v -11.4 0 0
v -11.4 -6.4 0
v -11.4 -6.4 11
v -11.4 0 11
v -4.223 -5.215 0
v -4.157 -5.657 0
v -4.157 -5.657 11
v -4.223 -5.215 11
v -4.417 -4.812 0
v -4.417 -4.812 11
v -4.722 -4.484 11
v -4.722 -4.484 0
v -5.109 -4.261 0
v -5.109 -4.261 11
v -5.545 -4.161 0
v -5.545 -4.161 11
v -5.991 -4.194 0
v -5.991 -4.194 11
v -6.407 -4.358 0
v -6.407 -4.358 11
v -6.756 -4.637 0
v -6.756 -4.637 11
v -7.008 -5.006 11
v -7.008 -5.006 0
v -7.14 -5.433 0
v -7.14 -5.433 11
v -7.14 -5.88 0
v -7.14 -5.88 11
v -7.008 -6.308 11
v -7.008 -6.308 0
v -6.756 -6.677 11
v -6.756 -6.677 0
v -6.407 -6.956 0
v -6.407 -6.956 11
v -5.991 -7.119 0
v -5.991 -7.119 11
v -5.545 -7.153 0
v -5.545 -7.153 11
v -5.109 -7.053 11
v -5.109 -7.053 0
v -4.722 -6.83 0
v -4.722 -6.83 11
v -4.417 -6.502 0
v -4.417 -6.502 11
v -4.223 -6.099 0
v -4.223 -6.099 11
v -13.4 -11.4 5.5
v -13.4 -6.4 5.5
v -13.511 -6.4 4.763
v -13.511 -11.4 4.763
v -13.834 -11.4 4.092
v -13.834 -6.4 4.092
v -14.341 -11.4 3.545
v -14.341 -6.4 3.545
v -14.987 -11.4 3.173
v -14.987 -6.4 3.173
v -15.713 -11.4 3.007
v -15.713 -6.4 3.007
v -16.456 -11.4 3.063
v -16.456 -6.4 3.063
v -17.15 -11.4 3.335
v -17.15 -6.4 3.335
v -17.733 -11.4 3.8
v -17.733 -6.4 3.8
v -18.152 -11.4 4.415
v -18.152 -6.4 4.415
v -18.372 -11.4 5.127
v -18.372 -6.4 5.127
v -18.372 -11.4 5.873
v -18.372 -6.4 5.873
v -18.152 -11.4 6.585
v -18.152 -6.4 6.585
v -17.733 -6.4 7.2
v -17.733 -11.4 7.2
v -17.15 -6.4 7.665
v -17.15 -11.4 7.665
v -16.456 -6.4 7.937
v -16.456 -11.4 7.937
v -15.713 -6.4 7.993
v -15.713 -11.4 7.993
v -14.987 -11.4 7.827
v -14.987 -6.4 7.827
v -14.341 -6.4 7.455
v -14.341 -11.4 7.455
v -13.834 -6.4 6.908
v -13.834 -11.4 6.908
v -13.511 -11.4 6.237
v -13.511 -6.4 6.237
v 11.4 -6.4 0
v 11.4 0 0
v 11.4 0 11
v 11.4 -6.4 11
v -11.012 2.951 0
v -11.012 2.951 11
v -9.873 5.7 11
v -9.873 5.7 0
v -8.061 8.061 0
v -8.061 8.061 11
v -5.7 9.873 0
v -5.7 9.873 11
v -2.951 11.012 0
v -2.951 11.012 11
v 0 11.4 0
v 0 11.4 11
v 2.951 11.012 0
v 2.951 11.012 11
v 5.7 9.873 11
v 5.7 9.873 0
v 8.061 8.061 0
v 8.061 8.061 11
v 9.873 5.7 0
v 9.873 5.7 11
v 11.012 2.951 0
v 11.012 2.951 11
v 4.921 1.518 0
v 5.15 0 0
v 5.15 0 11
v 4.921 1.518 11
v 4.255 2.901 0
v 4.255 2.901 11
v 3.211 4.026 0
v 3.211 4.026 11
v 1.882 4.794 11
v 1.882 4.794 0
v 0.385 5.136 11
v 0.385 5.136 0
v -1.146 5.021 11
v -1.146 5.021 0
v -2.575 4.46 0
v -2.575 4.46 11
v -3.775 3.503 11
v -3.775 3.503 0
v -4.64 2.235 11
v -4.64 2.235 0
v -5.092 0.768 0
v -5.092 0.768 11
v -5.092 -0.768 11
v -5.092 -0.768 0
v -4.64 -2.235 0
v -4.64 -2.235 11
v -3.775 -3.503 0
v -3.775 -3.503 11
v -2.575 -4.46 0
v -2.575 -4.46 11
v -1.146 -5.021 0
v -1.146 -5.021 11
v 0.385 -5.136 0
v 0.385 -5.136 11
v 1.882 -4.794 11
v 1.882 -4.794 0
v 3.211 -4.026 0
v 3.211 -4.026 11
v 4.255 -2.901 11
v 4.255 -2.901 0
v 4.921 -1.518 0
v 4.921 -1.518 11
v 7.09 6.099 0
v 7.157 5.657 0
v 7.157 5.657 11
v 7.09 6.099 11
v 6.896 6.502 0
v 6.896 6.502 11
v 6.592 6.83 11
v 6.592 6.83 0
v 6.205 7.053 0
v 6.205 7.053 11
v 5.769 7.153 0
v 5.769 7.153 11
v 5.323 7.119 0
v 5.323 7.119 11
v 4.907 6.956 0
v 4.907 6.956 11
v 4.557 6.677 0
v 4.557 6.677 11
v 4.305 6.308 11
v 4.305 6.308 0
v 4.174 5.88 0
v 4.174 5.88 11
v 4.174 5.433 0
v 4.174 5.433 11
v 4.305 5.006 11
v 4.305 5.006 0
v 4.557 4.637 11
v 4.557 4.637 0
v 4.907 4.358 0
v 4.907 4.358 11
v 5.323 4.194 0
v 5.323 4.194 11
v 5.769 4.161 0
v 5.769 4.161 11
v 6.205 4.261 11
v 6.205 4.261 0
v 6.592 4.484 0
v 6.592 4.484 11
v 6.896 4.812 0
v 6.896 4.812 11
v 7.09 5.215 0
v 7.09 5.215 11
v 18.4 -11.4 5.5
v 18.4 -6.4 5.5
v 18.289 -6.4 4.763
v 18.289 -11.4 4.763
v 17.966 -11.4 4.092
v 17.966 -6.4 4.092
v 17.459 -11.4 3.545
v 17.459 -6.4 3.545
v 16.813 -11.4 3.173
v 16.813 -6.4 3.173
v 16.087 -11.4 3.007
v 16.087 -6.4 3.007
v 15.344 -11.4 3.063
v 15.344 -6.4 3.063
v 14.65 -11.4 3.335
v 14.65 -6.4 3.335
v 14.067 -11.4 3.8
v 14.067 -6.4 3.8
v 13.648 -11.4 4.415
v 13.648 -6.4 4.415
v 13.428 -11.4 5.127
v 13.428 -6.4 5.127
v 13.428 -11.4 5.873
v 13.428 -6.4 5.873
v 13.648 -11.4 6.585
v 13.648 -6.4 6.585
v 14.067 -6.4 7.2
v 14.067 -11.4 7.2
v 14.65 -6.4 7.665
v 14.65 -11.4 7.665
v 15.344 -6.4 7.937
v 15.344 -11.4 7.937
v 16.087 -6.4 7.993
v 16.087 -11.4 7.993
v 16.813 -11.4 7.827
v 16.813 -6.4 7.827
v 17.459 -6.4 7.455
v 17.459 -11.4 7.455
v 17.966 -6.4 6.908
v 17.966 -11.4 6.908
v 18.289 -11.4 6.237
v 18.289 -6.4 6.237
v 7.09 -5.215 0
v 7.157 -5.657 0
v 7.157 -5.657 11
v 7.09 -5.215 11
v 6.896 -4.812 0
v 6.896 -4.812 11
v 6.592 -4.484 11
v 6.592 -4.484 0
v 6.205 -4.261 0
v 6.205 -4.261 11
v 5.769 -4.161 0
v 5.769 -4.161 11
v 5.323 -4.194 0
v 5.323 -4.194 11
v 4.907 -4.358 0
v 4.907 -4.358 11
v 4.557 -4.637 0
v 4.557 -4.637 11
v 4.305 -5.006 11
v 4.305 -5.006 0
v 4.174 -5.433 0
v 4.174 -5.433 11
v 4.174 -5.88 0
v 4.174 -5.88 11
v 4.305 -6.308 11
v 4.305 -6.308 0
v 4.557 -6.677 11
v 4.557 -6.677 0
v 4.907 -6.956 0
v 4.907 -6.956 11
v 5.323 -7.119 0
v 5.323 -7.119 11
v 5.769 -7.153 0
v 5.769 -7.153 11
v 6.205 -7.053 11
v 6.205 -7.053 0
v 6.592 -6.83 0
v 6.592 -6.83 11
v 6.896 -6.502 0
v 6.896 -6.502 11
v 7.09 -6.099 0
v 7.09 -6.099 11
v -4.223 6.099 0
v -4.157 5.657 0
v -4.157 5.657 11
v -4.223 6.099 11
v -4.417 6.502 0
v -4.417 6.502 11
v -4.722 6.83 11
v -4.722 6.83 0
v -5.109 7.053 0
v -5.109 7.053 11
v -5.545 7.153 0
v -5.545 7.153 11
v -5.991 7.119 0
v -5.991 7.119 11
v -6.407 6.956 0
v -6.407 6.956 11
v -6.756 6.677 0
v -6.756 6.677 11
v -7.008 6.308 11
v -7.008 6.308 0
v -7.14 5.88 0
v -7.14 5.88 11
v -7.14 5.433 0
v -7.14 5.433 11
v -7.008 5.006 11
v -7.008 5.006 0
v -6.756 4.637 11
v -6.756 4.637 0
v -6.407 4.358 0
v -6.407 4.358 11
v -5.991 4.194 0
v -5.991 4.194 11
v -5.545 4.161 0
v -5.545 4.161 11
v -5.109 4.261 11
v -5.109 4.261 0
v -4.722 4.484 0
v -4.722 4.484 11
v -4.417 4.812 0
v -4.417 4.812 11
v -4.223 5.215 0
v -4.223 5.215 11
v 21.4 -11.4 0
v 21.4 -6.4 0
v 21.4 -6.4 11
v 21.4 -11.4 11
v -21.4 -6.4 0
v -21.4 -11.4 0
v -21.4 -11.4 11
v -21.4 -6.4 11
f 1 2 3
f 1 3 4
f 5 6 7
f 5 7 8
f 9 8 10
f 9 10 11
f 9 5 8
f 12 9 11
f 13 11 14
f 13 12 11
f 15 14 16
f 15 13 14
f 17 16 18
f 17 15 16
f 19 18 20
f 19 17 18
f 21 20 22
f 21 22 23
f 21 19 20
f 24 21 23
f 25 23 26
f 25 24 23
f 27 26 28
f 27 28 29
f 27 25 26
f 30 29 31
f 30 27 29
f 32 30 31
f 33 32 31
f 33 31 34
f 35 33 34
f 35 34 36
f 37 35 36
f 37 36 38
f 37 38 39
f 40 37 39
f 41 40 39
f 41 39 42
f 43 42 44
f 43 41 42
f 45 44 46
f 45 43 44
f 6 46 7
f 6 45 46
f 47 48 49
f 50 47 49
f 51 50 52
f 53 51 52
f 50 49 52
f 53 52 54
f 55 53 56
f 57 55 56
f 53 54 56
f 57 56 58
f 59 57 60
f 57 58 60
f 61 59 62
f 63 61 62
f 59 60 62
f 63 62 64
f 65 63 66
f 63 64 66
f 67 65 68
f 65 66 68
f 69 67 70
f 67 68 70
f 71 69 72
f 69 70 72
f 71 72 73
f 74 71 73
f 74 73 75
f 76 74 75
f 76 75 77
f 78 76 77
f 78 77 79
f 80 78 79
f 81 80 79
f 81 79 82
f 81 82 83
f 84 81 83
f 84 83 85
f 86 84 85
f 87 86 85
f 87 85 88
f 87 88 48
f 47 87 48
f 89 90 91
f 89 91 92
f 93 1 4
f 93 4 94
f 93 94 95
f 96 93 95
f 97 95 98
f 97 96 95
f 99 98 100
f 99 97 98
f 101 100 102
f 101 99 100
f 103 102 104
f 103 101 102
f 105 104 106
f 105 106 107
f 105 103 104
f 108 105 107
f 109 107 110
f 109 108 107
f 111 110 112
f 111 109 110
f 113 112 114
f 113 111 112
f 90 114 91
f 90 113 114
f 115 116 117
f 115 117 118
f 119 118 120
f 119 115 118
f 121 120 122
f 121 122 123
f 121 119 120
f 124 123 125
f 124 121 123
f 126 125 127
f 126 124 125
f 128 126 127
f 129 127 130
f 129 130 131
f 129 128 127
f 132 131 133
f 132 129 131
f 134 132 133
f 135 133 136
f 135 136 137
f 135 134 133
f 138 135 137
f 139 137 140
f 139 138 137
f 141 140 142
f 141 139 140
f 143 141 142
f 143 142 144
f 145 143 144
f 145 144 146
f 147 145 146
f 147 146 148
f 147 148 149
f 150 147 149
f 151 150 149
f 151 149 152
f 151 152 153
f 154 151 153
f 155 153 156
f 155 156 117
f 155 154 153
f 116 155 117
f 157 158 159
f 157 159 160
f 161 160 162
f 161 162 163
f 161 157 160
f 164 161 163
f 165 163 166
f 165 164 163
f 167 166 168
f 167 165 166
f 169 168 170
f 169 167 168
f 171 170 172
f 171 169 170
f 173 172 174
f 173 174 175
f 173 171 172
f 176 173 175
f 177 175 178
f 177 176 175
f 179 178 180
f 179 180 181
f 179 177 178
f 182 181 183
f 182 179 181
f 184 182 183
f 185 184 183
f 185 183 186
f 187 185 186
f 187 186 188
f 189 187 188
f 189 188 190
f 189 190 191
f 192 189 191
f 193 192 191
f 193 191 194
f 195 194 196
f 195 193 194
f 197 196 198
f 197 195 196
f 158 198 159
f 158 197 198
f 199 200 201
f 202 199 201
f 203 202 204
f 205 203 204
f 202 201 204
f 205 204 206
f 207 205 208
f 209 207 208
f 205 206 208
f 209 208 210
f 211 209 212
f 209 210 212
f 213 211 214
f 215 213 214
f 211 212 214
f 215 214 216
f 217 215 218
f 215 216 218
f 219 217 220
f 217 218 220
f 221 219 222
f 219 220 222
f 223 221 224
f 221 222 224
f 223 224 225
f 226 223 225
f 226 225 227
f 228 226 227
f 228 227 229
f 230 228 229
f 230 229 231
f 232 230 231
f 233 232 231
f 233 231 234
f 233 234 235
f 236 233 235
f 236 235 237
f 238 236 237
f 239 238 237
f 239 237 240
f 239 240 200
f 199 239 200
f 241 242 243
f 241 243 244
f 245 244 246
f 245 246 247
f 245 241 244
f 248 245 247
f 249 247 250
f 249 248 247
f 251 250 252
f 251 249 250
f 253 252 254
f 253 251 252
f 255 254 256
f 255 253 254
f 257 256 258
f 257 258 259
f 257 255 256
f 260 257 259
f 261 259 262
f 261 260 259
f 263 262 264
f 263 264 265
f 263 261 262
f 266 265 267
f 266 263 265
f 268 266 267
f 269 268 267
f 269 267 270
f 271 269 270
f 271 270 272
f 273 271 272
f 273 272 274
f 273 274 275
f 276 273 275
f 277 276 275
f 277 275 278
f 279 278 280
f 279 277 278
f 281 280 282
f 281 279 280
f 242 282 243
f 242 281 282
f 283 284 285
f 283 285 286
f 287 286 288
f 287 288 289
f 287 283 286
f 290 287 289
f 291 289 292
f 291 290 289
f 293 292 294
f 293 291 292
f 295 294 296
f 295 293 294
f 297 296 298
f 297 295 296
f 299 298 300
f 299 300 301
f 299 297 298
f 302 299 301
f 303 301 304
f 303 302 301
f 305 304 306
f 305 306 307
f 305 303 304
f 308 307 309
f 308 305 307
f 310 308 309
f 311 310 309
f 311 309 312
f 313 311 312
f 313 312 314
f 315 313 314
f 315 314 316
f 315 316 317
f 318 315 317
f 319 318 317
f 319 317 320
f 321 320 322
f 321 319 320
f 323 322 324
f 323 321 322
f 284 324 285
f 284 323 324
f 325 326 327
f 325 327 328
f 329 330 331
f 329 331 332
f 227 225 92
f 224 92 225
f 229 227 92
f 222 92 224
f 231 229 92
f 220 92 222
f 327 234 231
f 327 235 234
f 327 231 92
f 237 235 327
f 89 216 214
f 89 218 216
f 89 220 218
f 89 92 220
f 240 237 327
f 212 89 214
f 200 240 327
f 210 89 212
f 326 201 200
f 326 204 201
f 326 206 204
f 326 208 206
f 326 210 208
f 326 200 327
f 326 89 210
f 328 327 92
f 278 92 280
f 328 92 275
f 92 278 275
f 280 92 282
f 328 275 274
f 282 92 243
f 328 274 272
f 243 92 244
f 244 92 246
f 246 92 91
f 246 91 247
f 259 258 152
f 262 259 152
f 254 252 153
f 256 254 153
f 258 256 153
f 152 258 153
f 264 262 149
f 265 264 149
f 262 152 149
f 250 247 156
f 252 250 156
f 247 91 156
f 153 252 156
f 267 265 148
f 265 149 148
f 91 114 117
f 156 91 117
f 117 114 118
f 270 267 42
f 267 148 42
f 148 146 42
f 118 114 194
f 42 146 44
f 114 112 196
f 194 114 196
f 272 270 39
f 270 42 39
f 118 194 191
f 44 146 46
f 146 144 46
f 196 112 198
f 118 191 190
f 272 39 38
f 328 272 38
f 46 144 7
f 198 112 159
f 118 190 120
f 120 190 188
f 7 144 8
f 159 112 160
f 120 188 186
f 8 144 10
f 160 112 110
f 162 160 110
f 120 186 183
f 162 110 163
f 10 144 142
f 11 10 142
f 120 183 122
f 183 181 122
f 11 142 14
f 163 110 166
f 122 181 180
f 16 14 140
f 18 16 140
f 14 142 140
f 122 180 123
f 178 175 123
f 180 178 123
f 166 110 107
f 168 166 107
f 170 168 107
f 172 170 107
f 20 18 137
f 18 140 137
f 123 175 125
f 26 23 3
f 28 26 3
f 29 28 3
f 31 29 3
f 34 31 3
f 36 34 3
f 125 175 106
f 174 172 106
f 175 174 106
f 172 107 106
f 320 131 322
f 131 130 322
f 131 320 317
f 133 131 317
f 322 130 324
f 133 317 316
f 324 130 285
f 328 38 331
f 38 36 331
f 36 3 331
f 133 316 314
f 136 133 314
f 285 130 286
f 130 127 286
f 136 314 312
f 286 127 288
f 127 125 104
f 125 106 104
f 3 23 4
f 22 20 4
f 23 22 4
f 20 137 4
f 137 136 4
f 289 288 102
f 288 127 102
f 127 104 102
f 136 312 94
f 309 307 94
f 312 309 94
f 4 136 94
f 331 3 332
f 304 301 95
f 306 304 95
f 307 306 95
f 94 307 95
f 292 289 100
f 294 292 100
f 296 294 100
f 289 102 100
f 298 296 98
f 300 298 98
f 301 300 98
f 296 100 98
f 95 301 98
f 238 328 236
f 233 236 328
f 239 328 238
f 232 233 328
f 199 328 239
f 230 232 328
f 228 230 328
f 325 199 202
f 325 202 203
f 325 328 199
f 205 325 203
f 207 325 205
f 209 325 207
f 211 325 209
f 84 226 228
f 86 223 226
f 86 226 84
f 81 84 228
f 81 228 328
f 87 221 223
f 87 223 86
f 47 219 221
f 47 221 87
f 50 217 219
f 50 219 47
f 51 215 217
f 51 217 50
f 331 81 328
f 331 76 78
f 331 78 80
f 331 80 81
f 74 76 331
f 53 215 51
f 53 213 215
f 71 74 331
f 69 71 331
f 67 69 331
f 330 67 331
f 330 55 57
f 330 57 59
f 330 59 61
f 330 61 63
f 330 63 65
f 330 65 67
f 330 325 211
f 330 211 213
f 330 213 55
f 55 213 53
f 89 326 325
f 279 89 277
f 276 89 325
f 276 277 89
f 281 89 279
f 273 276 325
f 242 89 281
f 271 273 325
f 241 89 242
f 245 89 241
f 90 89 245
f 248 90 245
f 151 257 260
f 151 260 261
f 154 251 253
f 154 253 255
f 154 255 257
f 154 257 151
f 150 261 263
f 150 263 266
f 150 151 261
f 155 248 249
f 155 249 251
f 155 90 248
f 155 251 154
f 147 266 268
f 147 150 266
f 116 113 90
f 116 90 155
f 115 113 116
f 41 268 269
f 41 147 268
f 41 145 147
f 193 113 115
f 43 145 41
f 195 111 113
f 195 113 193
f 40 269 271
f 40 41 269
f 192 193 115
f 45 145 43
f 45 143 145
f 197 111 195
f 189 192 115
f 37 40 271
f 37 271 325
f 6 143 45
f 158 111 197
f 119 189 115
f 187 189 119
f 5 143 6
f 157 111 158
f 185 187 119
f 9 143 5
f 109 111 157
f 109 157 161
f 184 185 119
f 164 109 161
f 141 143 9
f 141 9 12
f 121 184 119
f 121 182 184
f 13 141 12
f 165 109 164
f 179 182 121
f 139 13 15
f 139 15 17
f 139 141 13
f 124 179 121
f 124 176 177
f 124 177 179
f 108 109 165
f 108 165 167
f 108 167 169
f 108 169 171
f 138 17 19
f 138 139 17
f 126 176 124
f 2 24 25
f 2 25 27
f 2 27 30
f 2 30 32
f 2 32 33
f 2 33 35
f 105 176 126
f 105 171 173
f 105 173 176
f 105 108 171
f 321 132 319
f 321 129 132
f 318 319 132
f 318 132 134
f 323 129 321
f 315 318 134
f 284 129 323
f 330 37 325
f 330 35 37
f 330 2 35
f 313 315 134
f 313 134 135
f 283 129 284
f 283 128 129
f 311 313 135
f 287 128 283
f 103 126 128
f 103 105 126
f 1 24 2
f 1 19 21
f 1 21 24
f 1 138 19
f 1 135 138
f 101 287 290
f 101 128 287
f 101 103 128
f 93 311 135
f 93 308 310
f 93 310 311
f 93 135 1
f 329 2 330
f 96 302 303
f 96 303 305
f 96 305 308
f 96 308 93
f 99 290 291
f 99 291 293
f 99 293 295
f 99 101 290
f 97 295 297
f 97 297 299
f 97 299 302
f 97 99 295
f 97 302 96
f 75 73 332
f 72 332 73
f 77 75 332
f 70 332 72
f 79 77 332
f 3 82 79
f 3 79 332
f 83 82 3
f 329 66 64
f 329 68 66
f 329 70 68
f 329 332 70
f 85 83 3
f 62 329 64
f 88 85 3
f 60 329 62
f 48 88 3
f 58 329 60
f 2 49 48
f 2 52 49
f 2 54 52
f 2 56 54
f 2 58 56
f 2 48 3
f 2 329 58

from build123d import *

# Parameters (mm, degrees)
SKETCH1_R           = 5.15
SKETCH1_R_2         = 1.5
BOSS_EXTRUDE1_DEPTH = 11
SKETCH2_R           = 2.5
CUT_EXTRUDE1_DEPTH  = 6


with BuildPart() as part:
    # Sketch1 → Boss-Extrude1 (new body)
    with BuildSketch(Plane.XY):
        with BuildLine():
            Line((-21.4, -6.4), (-11.4, -6.4))
            Line((-11.4, -6.4), (-11.4, 0))
            ThreePointArc((-11.4, 0), (0, 11.4), (11.4, 0))
            Line((11.4, 0), (11.4, -6.4))
            Line((11.4, -6.4), (21.4, -6.4))
            Line((21.4, -6.4), (21.4, -11.4))
            Line((21.4, -11.4), (-21.4, -11.4))
            Line((-21.4, -11.4), (-21.4, -6.4))
        make_face()
        Circle(SKETCH1_R, mode=Mode.SUBTRACT)
        with Locations((-5.656854249, 5.656854249)):
            Circle(SKETCH1_R_2, mode=Mode.SUBTRACT)
        with Locations((5.656854249, 5.656854249)):
            Circle(SKETCH1_R_2, mode=Mode.SUBTRACT)
        with Locations((-5.656854249, -5.656854249)):
            Circle(SKETCH1_R_2, mode=Mode.SUBTRACT)
        with Locations((5.656854249, -5.656854249)):
            Circle(SKETCH1_R_2, mode=Mode.SUBTRACT)
    extrude(amount=BOSS_EXTRUDE1_DEPTH)

    # Sketch2 → Cut-Extrude1 (cut, through all)
    with BuildSketch(Plane(origin=(0, -6.4, 0), x_dir=(1, 0, 0), z_dir=(0, 1, 0))):
        with Locations((-15.9, -5.5)):
            Circle(SKETCH2_R)
        with Locations((15.9, -5.5)):
            Circle(SKETCH2_R)
    extrude(amount=-CUT_EXTRUDE1_DEPTH, mode=Mode.SUBTRACT)


solid = part.part
